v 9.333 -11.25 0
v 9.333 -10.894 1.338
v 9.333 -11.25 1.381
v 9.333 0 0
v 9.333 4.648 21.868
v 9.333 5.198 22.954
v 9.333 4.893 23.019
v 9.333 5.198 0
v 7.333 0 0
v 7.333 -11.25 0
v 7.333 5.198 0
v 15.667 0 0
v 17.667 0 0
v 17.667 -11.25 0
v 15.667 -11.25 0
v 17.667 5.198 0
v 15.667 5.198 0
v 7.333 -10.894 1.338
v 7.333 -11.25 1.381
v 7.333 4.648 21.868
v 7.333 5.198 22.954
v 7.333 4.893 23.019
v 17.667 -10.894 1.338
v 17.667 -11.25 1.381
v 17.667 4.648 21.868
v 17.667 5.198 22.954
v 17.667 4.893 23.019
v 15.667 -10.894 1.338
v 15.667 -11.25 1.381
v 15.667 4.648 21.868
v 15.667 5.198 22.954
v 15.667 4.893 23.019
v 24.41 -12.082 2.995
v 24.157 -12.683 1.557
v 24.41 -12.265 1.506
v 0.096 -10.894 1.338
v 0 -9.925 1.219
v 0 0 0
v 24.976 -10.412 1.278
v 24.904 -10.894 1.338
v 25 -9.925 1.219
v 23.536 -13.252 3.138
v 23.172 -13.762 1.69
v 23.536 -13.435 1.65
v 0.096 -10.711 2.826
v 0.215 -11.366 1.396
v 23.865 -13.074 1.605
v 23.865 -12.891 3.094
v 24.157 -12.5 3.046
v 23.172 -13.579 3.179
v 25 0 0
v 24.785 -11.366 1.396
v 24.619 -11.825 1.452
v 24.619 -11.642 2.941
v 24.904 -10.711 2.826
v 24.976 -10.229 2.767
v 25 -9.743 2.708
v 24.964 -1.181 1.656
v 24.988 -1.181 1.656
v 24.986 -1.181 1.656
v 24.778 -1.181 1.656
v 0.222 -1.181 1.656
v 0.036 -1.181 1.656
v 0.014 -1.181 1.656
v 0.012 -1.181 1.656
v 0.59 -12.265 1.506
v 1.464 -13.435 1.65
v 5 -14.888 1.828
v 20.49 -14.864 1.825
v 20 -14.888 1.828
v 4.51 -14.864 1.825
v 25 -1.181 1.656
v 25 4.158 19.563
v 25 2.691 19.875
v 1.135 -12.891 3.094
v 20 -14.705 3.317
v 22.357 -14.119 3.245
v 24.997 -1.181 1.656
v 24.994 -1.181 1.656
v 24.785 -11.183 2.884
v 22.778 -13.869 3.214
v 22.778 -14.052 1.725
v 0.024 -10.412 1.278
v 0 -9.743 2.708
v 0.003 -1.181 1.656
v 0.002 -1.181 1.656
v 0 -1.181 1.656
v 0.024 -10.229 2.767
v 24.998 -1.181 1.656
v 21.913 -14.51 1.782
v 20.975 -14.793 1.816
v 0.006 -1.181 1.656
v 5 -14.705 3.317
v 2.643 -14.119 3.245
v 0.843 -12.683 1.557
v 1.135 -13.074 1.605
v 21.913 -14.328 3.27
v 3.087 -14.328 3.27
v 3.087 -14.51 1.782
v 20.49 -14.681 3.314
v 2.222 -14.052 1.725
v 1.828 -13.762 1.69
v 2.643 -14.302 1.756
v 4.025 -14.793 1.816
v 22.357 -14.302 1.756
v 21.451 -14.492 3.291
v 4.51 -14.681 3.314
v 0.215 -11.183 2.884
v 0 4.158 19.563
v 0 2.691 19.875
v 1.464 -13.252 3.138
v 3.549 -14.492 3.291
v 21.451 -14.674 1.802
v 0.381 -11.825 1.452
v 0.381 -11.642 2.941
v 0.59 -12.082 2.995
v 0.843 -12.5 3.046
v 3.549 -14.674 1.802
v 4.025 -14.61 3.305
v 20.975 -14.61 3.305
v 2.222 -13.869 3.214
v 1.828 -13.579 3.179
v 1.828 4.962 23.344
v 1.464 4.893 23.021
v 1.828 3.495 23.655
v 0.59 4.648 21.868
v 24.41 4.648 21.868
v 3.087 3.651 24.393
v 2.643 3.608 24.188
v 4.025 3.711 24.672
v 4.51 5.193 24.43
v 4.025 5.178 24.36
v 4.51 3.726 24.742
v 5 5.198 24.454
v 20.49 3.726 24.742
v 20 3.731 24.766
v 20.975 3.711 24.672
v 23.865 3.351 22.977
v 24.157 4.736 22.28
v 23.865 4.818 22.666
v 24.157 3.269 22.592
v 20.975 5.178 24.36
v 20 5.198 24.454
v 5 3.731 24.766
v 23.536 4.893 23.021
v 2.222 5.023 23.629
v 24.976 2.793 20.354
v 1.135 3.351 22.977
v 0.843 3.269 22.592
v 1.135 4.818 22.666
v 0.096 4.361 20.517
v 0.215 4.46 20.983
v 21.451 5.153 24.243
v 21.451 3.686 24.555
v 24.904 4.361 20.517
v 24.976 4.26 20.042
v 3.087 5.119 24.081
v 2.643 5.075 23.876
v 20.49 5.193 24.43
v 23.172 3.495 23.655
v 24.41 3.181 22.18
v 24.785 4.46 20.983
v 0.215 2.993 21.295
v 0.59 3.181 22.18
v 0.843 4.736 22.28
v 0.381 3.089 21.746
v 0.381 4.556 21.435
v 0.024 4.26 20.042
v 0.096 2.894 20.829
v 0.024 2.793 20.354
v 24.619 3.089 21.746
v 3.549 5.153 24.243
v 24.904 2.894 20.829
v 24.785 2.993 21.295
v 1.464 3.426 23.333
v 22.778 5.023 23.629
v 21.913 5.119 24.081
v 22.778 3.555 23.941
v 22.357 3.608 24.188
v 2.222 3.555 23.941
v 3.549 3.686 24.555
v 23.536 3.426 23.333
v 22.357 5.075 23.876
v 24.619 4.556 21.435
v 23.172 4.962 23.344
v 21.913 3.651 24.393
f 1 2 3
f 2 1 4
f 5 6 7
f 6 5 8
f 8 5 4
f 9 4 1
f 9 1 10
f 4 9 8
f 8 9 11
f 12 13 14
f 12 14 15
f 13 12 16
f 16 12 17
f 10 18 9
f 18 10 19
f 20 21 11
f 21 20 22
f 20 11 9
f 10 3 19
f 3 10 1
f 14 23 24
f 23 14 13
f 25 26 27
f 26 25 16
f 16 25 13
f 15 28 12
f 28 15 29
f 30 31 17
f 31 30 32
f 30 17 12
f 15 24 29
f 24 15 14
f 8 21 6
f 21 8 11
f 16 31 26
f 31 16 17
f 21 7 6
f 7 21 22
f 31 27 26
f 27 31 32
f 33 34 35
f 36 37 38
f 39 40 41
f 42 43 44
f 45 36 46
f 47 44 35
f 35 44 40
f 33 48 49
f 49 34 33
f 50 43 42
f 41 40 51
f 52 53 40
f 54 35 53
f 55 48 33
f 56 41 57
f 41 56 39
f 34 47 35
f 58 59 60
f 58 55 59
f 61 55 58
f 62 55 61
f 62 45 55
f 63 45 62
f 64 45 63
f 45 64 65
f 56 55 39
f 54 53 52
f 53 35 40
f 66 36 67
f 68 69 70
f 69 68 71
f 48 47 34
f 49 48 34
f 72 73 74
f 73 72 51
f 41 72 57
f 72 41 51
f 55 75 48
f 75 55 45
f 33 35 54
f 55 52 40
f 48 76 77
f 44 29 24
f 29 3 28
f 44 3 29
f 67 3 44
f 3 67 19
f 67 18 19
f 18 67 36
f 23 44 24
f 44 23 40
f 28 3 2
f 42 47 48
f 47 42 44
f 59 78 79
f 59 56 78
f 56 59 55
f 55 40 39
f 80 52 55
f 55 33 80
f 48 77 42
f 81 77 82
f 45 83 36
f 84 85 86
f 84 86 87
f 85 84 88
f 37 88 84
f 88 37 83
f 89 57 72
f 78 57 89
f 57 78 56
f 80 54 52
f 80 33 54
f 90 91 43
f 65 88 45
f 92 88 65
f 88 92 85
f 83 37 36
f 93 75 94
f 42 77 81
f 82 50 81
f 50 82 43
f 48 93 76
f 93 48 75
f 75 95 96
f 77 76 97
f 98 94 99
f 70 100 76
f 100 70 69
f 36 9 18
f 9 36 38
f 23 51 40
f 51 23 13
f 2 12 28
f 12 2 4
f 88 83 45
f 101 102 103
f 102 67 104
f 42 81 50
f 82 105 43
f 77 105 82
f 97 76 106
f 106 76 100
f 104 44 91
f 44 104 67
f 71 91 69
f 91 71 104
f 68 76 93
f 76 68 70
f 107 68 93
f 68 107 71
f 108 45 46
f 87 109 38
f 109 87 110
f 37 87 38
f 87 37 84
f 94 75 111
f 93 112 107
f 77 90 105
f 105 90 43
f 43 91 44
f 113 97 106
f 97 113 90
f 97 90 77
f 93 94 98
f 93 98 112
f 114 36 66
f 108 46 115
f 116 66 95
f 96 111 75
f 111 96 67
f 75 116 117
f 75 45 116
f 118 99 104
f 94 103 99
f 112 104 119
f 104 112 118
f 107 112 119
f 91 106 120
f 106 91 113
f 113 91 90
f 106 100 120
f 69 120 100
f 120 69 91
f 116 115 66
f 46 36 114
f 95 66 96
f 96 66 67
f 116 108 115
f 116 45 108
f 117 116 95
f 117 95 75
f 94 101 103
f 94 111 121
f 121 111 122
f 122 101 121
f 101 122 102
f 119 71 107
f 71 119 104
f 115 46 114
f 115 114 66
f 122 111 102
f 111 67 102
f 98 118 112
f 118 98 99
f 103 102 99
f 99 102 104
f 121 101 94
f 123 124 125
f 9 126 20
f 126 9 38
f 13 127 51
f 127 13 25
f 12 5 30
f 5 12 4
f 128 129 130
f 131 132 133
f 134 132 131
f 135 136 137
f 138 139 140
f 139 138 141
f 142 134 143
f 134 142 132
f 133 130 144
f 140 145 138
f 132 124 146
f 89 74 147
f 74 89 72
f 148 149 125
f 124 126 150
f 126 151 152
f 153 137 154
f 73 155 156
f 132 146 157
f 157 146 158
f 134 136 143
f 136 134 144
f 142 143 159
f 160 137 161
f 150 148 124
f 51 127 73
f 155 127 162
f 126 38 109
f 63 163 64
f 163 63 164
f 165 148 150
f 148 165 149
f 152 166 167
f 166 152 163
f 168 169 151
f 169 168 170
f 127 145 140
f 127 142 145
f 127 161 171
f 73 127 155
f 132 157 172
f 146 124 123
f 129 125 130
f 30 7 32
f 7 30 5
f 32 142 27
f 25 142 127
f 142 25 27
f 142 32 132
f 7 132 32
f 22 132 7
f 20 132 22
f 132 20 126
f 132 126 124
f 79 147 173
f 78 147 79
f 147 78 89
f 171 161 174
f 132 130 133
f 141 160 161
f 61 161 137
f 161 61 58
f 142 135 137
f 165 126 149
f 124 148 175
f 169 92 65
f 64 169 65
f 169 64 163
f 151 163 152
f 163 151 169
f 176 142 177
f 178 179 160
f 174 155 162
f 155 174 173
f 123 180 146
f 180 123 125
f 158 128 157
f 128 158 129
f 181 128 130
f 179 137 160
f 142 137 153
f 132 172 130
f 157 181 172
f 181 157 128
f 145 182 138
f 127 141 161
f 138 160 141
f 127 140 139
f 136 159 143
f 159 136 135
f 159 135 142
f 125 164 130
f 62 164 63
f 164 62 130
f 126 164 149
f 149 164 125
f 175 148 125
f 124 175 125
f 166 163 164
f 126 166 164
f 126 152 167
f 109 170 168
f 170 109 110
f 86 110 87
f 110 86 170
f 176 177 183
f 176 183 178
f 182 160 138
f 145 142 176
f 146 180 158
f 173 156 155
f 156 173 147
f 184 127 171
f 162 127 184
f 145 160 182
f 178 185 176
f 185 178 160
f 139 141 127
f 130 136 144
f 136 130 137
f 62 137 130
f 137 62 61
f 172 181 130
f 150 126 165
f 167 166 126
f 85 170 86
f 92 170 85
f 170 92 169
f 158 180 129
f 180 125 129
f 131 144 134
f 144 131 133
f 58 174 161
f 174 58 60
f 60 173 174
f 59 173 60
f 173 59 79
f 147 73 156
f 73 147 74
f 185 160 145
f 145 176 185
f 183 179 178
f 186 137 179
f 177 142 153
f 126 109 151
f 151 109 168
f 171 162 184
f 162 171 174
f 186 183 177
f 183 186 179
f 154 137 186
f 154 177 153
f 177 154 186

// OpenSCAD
/* [Global] */

//Width of stand
sheet_x=25;	// min/step/max: [15:5:200]

//Thickness of stand
sheet_z=1.5; // [0.5:0.5:10]

//diameter of rounded edges
sheet_d_=10; // [0:1:50]

// Depth of seat 
bottom_sheet_y=15; // [10:1:100]

// Height of rest
top_sheet_y=25; // [10:1:100]

// angle between seat and rest
angle_sheets=85; // [0:1:180]

// angle between seat and ground
angle_seat=7; // [0:1:45]

// Number of legs
legs=1; // [0:1:25]

//Width of legs
leg_w=2;// [1:1:20]

/* [Global] */
$fn=64;

sheet_d=max(sheet_d_,0.0001);


module sheet(size=[25,15,1.5],d=10){
	hull(){
		translate([0,d/2,0])cube(size-[0,d/2,0]);
		translate([d/2,d/2,0])cylinder(d=d,h=size[2]);
		translate([size[0]-d/2,d/2,0])cylinder(d=d,h=size[2]);
	}
}


module seat_seat(){
	rotate([-angle_seat,0,0])translate([0,-bottom_sheet_y,0])sheet([sheet_x,bottom_sheet_y,sheet_z],sheet_d);
}
module seat_rest(){
		rotate([-angle_seat,0,0])rotate([angle_sheets,0,0])translate([0,top_sheet_y,sheet_z])rotate([180,0,0])sheet([sheet_x,top_sheet_y,sheet_z],sheet_d);
}
module seat(){
	union(){
		seat_seat();
		seat_rest();
	}
}


module standContainer(){
	union(){
		hull(){
			linear_extrude(sheet_z)projection(cut = false)seat_seat();
			seat_seat();
		}
		hull(){
			linear_extrude(sheet_z)projection(cut = false)seat_rest();
			seat_rest();
		}
	}
}

module legs(){
	dist=sheet_x/(legs+2);
	intersection(){
		union(){
			for(a=[1:1:legs+1]){
				translate([dist*a-leg_w/2,-bottom_sheet_y*0.75,0])
					cube([leg_w,top_sheet_y+bottom_sheet_y,top_sheet_y+bottom_sheet_y*2]);
			}
		}
		standContainer();
		translate([0,0,-sheet_z])standContainer();
	}
	
}

legs();
seat();
